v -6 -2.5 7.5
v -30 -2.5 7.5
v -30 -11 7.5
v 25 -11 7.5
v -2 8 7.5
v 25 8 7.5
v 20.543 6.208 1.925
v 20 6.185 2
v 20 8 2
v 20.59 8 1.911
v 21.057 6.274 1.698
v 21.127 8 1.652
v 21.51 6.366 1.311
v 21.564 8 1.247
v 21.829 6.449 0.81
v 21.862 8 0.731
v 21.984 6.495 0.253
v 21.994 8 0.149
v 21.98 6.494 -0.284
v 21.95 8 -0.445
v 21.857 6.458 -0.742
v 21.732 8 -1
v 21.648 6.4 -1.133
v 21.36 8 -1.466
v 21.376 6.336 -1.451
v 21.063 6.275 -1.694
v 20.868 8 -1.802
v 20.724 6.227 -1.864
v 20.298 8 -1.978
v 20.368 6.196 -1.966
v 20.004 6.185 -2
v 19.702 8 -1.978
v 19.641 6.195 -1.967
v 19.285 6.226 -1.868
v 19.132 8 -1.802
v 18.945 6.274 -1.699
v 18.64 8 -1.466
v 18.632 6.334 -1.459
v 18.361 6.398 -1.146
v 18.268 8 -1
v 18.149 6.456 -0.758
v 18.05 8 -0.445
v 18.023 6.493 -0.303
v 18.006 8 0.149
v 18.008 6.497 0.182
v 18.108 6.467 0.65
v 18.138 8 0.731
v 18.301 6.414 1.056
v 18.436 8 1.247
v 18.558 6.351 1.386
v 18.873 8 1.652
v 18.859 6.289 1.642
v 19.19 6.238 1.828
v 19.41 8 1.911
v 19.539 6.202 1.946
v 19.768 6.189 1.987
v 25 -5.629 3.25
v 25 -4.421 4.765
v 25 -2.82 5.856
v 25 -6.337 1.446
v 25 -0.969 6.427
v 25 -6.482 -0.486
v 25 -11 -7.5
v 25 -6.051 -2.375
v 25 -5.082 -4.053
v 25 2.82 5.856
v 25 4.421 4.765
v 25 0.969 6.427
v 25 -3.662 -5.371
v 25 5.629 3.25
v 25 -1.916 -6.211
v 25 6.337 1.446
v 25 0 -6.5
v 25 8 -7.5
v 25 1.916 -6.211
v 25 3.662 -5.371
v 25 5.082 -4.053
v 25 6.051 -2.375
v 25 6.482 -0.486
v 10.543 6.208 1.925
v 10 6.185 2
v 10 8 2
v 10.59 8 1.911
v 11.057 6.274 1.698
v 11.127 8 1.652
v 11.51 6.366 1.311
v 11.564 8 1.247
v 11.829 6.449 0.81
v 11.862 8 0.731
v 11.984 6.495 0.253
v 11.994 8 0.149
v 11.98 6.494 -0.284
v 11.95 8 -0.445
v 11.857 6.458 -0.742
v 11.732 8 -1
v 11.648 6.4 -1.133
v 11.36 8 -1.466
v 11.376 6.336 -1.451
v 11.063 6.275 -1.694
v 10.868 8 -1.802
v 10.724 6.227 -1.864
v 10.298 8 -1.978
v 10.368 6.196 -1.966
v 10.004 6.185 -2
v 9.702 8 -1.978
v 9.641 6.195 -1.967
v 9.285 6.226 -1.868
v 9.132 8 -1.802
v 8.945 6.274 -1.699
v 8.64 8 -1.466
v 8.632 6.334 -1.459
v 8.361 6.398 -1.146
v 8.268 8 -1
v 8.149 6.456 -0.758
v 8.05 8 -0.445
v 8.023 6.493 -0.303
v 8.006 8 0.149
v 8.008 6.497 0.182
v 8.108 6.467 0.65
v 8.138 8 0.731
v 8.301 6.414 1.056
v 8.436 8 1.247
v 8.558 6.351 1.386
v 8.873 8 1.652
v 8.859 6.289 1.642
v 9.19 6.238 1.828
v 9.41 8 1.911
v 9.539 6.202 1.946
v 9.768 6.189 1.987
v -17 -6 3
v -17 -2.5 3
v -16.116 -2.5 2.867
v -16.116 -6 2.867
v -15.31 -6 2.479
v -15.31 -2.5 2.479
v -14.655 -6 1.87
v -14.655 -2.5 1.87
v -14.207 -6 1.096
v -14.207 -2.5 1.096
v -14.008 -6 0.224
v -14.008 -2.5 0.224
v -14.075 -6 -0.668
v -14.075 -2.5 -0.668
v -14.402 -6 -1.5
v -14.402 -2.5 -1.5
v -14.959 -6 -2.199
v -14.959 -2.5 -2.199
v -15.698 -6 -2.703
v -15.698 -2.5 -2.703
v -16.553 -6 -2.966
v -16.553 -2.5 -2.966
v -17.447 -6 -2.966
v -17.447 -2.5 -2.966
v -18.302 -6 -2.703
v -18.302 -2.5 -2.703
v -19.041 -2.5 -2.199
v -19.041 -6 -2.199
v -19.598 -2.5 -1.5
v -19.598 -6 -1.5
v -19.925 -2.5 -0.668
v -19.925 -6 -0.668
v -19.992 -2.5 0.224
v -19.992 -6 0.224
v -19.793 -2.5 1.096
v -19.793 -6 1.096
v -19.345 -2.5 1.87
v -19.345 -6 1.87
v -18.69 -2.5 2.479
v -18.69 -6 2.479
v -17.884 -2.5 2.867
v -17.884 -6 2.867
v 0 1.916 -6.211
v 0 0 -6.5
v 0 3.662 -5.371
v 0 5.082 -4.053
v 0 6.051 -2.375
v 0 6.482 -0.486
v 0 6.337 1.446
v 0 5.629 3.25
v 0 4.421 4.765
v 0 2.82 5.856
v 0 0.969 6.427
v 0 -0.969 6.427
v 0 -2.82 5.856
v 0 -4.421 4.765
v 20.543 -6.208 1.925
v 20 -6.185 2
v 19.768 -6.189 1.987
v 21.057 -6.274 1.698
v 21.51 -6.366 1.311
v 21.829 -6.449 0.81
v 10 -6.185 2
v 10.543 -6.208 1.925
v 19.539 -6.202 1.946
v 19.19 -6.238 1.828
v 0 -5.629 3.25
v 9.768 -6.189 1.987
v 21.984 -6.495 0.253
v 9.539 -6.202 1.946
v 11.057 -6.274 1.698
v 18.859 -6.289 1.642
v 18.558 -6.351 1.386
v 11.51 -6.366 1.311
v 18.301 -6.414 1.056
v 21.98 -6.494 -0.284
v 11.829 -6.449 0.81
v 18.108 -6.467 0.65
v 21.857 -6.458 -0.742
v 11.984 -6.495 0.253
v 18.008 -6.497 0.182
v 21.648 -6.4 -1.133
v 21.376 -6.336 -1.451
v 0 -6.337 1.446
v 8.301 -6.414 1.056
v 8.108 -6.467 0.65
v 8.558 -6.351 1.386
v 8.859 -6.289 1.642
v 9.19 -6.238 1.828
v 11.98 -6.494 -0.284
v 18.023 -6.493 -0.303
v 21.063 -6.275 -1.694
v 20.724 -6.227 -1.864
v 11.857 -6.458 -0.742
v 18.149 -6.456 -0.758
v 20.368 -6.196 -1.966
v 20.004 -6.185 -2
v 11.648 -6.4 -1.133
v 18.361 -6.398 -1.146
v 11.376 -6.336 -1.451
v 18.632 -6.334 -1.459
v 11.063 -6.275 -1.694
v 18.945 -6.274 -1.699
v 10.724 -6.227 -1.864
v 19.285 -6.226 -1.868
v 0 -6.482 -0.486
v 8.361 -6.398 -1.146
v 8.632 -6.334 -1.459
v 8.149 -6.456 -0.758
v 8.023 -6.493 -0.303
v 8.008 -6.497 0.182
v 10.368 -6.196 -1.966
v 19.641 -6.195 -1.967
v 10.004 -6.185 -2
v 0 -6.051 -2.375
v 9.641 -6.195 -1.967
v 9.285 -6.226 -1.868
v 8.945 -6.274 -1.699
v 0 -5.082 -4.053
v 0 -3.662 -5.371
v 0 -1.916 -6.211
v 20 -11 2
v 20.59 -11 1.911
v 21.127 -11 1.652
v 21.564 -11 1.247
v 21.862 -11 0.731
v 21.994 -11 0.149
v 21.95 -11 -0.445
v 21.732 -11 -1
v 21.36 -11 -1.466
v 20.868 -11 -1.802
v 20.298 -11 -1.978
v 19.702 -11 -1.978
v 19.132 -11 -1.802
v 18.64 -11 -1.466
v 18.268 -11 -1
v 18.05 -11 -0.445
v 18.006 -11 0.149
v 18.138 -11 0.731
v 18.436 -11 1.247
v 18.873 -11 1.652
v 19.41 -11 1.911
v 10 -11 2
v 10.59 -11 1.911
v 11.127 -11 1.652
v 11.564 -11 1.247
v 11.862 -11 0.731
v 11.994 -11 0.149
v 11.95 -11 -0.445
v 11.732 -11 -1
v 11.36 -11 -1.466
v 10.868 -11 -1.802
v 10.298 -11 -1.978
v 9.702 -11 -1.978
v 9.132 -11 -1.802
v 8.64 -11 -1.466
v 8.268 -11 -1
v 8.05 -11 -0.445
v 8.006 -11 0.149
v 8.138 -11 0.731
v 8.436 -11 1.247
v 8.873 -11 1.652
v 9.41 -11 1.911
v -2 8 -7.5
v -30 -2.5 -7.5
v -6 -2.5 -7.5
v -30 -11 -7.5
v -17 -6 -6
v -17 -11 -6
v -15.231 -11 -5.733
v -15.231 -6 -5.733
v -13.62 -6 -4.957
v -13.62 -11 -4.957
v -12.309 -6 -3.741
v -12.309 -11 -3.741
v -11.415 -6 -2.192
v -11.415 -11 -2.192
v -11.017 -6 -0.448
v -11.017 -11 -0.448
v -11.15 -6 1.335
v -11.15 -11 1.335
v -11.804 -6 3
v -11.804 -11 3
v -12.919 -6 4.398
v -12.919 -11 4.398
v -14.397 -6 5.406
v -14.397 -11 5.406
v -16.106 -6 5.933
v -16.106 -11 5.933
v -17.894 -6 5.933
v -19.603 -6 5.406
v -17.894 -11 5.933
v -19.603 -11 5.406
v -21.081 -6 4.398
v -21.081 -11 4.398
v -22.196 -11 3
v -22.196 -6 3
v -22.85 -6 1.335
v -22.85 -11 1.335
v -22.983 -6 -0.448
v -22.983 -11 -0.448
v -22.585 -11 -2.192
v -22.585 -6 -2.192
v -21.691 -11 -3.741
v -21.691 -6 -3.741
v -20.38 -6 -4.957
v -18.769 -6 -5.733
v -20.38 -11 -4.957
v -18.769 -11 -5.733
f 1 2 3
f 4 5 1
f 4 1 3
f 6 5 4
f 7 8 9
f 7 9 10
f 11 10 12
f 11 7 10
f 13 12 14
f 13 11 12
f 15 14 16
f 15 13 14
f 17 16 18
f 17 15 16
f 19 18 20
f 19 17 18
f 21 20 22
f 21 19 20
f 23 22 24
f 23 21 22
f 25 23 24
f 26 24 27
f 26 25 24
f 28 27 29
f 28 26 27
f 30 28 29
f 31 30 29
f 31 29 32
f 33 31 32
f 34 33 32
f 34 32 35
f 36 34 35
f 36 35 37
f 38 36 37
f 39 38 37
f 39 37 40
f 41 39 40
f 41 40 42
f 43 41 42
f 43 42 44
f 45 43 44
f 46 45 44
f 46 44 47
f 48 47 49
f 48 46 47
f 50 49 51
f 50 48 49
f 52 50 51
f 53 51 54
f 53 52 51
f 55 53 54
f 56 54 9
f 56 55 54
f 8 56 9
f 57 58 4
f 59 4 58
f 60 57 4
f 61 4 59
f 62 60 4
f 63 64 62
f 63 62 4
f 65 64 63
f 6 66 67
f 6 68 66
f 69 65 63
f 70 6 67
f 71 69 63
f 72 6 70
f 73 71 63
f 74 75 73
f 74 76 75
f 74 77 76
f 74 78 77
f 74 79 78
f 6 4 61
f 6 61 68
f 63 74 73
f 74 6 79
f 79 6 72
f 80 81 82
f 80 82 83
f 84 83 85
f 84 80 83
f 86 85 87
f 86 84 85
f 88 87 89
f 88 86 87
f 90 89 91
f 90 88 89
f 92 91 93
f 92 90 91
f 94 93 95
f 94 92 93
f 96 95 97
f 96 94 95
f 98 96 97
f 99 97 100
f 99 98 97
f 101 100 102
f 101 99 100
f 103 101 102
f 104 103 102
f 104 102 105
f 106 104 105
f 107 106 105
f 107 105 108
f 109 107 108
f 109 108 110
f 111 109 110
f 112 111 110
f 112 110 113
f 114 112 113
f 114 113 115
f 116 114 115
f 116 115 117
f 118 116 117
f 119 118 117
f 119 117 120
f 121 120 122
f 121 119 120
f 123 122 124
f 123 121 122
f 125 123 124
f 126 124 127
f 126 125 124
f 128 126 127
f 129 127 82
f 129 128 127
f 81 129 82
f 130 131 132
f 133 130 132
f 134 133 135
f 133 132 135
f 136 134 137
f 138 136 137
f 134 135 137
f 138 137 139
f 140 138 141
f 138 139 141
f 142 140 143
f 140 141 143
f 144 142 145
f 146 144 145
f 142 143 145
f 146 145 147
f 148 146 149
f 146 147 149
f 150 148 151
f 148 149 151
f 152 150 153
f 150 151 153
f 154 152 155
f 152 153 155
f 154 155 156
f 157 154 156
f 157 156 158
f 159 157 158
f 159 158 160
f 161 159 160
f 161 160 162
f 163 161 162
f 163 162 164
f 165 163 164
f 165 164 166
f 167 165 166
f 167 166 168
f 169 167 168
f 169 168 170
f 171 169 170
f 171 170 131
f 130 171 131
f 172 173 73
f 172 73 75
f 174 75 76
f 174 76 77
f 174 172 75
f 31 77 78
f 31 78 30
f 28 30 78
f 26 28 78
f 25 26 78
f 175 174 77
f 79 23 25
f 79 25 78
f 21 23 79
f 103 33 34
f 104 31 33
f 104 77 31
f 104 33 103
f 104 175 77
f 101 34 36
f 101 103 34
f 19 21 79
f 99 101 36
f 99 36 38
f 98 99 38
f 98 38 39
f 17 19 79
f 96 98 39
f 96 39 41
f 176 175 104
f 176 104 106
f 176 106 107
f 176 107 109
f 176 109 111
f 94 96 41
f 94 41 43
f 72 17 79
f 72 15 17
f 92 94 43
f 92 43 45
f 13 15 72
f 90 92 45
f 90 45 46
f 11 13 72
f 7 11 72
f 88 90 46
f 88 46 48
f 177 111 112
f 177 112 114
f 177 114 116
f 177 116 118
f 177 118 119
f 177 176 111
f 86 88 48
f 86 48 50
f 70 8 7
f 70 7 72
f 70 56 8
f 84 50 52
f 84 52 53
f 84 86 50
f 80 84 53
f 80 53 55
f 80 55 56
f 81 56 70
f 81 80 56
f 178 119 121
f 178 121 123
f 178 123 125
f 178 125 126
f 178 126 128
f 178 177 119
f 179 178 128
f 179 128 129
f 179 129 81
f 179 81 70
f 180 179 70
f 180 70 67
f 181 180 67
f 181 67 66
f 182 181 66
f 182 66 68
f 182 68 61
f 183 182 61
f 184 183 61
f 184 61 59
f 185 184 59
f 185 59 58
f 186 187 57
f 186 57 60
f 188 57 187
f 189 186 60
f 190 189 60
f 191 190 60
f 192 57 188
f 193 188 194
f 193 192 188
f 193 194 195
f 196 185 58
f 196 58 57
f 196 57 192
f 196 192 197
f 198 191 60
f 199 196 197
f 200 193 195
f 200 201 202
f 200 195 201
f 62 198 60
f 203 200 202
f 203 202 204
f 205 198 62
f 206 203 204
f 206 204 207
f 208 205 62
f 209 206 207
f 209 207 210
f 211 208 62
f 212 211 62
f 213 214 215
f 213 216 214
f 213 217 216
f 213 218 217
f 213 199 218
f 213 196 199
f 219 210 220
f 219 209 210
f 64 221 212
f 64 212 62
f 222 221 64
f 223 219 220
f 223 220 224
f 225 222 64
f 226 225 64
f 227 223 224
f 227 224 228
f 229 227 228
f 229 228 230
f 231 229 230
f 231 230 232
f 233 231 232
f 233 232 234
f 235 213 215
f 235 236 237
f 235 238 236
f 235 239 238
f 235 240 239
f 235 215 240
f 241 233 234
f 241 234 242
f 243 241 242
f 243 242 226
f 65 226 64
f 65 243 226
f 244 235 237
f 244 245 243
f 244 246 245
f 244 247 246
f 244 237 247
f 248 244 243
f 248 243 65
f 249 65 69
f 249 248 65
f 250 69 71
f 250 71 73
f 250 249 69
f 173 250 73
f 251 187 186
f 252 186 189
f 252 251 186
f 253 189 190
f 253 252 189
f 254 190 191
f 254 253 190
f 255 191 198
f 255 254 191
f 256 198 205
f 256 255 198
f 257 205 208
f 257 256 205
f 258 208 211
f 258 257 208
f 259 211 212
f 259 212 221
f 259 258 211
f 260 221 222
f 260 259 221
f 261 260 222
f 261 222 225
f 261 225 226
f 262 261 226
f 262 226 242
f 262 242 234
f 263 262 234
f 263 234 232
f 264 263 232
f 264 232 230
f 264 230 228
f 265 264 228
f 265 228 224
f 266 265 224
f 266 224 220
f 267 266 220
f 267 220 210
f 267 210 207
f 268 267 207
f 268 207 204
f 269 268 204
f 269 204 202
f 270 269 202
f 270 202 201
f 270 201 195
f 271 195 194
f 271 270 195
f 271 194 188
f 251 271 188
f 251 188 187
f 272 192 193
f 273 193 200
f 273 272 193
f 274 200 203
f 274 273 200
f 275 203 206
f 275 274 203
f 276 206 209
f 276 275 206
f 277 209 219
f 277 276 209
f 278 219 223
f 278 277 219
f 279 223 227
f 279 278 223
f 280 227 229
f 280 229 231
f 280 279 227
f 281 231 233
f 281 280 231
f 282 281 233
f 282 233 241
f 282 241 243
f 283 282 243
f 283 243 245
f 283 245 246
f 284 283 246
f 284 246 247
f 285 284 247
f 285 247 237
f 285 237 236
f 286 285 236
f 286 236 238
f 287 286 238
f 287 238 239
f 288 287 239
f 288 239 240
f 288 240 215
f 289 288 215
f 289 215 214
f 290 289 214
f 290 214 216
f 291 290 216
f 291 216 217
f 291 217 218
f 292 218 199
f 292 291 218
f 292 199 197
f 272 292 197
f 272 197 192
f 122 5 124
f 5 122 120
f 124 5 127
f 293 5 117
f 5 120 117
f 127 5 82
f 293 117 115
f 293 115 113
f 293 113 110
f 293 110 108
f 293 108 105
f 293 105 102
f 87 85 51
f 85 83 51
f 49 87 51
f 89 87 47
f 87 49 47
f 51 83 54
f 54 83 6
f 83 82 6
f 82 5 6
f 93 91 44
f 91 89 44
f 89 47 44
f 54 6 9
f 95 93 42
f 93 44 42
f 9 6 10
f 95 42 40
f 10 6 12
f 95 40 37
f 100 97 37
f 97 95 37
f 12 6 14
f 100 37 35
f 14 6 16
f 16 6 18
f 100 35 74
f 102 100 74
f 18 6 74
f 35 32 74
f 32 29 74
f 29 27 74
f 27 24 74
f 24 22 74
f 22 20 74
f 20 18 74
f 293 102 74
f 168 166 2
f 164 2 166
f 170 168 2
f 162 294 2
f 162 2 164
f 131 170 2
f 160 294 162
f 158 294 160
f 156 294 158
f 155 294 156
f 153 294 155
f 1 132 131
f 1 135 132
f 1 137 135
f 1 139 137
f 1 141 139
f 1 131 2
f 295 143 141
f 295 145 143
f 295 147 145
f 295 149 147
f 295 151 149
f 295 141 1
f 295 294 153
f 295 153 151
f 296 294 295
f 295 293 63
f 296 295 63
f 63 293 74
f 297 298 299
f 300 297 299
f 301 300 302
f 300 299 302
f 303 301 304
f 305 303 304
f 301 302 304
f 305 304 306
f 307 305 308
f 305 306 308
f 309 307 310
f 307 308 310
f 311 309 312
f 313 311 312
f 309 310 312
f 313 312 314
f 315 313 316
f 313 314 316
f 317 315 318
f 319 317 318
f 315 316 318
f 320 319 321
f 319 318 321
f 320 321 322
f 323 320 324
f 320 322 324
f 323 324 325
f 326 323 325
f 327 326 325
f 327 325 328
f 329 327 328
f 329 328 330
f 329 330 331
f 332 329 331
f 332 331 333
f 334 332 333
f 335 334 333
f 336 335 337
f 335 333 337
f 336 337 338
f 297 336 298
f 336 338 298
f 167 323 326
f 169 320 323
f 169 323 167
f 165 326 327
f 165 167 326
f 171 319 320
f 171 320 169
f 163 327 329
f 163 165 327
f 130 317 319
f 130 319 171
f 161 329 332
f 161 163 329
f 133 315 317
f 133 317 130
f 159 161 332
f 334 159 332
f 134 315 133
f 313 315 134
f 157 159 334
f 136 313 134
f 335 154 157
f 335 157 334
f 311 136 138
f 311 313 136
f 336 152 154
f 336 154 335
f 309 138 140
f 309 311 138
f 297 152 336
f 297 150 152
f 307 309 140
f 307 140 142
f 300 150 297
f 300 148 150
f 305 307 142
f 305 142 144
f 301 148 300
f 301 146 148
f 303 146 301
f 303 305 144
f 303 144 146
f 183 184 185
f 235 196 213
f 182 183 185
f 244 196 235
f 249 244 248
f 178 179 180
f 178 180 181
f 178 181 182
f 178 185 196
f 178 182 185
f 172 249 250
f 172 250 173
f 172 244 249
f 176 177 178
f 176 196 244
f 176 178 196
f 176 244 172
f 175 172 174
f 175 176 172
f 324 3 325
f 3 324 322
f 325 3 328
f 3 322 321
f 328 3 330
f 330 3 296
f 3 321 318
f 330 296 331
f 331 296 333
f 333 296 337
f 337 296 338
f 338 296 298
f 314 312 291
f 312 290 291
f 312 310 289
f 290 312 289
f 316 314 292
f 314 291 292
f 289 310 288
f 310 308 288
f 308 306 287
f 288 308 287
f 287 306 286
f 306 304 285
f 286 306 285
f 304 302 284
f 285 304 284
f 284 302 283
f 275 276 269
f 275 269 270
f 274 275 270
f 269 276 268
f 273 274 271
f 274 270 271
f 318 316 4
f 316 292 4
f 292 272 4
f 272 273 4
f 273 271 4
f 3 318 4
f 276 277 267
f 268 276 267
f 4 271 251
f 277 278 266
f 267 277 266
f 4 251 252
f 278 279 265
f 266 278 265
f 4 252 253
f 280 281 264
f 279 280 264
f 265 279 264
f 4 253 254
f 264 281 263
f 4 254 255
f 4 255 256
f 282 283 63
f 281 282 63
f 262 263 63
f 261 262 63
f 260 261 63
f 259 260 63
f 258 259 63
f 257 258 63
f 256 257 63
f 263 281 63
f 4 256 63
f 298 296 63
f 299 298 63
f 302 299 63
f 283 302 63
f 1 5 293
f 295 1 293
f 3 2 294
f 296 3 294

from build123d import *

# Parameters (mm, degrees)
SKETCH1_W               = 15
SKETCH1_H               = 19
SKETCH1_R               = 6.5
BOSS_EXTRUDE1_DEPTH     = 25
SKETCH2_W               = 15
SKETCH2_H               = 19
BOSS_EXTRUDE2_DEPTH     = 2
CUT_EXTRUDE1_DEPTH      = 29.324018077
CUT_EXTRUDE1_DEPTH_BACK = 29.324018077
SKETCH4_R               = 2
SKETCH3_W               = 28
SKETCH3_H               = 15
SKETCH3_R               = 3
BOSS_EXTRUDE3_DEPTH     = 8.5
CHAMFER1_SIZE2          = 10.5
CHAMFER1_SIZE           = 4
SKETCH7_R               = 6
CUT_EXTRUDE4_DEPTH      = 5


with BuildPart() as part:
    # Sketch1 → Boss-Extrude1 (new body)
    with BuildSketch(Plane(origin=(0, 0, 0), x_dir=(0, 0, -1), z_dir=(1, 0, 0))):
        with Locations((0, -1.5)):
            Rectangle(SKETCH1_W, SKETCH1_H)
        Circle(SKETCH1_R, mode=Mode.SUBTRACT)
    extrude(amount=BOSS_EXTRUDE1_DEPTH)

    # Sketch2 → Boss-Extrude2 (add)
    with BuildSketch(Plane(origin=(0, 0, 0), x_dir=(0, 0, -1), z_dir=(1, 0, 0))):
        with Locations((0, -1.5)):
            Rectangle(SKETCH2_W, SKETCH2_H)
    extrude(amount=-BOSS_EXTRUDE2_DEPTH)

    # Sketch4 → Cut-Extrude1 (cut, two sides: drawn at the far end of the back side and taken through both)
    with BuildSketch(Plane(origin=(0, 0, 0), x_dir=(1, 0, 0), z_dir=(0, 1, 0)).offset(-CUT_EXTRUDE1_DEPTH_BACK)):
        with Locations(Location((10, 0, 0), (0, 0, 270))):
            Circle(SKETCH4_R)
        with Locations(Location((20, 0, 0), (0, 0, 270))):
            Circle(SKETCH4_R)
    extrude(amount=CUT_EXTRUDE1_DEPTH + CUT_EXTRUDE1_DEPTH_BACK, mode=Mode.SUBTRACT)

    # Sketch3 → Boss-Extrude3 (add)
    with BuildSketch(Plane(origin=(0, -2.5, 0), x_dir=(1, 0, 0), z_dir=(0, 1, 0))):
        with Locations((-16, 0)):
            Rectangle(SKETCH3_W, SKETCH3_H)
        with Locations(Location((-17, 0, 0), (0, 0, 270))):
            Circle(SKETCH3_R, mode=Mode.SUBTRACT)
    extrude(amount=-BOSS_EXTRUDE3_DEPTH)

    # Chamfer1
    chamfer1_edges = [part.edges().sort_by_distance(p)[0] for p in [
        (-2, -2.5, 0),
    ]]
    chamfer1_side = [part.faces().sort_by_distance(p)[0] for p in [
        (-2.08, -2.5, 0),
    ]]
    chamfer(chamfer1_edges, length=CHAMFER1_SIZE - 0.0001, length2=CHAMFER1_SIZE2 - 0.0001, reference=chamfer1_side[0])  # a hair under: the kernel refuses the full size

    # Sketch7 → Cut-Extrude4 (cut)
    with BuildSketch(Plane.XZ.offset(11)):
        with Locations(Location((-17, 0, 0), (0, 0, 270))):
            Circle(SKETCH7_R)
    extrude(amount=-CUT_EXTRUDE4_DEPTH, mode=Mode.SUBTRACT)


solid = part.part
